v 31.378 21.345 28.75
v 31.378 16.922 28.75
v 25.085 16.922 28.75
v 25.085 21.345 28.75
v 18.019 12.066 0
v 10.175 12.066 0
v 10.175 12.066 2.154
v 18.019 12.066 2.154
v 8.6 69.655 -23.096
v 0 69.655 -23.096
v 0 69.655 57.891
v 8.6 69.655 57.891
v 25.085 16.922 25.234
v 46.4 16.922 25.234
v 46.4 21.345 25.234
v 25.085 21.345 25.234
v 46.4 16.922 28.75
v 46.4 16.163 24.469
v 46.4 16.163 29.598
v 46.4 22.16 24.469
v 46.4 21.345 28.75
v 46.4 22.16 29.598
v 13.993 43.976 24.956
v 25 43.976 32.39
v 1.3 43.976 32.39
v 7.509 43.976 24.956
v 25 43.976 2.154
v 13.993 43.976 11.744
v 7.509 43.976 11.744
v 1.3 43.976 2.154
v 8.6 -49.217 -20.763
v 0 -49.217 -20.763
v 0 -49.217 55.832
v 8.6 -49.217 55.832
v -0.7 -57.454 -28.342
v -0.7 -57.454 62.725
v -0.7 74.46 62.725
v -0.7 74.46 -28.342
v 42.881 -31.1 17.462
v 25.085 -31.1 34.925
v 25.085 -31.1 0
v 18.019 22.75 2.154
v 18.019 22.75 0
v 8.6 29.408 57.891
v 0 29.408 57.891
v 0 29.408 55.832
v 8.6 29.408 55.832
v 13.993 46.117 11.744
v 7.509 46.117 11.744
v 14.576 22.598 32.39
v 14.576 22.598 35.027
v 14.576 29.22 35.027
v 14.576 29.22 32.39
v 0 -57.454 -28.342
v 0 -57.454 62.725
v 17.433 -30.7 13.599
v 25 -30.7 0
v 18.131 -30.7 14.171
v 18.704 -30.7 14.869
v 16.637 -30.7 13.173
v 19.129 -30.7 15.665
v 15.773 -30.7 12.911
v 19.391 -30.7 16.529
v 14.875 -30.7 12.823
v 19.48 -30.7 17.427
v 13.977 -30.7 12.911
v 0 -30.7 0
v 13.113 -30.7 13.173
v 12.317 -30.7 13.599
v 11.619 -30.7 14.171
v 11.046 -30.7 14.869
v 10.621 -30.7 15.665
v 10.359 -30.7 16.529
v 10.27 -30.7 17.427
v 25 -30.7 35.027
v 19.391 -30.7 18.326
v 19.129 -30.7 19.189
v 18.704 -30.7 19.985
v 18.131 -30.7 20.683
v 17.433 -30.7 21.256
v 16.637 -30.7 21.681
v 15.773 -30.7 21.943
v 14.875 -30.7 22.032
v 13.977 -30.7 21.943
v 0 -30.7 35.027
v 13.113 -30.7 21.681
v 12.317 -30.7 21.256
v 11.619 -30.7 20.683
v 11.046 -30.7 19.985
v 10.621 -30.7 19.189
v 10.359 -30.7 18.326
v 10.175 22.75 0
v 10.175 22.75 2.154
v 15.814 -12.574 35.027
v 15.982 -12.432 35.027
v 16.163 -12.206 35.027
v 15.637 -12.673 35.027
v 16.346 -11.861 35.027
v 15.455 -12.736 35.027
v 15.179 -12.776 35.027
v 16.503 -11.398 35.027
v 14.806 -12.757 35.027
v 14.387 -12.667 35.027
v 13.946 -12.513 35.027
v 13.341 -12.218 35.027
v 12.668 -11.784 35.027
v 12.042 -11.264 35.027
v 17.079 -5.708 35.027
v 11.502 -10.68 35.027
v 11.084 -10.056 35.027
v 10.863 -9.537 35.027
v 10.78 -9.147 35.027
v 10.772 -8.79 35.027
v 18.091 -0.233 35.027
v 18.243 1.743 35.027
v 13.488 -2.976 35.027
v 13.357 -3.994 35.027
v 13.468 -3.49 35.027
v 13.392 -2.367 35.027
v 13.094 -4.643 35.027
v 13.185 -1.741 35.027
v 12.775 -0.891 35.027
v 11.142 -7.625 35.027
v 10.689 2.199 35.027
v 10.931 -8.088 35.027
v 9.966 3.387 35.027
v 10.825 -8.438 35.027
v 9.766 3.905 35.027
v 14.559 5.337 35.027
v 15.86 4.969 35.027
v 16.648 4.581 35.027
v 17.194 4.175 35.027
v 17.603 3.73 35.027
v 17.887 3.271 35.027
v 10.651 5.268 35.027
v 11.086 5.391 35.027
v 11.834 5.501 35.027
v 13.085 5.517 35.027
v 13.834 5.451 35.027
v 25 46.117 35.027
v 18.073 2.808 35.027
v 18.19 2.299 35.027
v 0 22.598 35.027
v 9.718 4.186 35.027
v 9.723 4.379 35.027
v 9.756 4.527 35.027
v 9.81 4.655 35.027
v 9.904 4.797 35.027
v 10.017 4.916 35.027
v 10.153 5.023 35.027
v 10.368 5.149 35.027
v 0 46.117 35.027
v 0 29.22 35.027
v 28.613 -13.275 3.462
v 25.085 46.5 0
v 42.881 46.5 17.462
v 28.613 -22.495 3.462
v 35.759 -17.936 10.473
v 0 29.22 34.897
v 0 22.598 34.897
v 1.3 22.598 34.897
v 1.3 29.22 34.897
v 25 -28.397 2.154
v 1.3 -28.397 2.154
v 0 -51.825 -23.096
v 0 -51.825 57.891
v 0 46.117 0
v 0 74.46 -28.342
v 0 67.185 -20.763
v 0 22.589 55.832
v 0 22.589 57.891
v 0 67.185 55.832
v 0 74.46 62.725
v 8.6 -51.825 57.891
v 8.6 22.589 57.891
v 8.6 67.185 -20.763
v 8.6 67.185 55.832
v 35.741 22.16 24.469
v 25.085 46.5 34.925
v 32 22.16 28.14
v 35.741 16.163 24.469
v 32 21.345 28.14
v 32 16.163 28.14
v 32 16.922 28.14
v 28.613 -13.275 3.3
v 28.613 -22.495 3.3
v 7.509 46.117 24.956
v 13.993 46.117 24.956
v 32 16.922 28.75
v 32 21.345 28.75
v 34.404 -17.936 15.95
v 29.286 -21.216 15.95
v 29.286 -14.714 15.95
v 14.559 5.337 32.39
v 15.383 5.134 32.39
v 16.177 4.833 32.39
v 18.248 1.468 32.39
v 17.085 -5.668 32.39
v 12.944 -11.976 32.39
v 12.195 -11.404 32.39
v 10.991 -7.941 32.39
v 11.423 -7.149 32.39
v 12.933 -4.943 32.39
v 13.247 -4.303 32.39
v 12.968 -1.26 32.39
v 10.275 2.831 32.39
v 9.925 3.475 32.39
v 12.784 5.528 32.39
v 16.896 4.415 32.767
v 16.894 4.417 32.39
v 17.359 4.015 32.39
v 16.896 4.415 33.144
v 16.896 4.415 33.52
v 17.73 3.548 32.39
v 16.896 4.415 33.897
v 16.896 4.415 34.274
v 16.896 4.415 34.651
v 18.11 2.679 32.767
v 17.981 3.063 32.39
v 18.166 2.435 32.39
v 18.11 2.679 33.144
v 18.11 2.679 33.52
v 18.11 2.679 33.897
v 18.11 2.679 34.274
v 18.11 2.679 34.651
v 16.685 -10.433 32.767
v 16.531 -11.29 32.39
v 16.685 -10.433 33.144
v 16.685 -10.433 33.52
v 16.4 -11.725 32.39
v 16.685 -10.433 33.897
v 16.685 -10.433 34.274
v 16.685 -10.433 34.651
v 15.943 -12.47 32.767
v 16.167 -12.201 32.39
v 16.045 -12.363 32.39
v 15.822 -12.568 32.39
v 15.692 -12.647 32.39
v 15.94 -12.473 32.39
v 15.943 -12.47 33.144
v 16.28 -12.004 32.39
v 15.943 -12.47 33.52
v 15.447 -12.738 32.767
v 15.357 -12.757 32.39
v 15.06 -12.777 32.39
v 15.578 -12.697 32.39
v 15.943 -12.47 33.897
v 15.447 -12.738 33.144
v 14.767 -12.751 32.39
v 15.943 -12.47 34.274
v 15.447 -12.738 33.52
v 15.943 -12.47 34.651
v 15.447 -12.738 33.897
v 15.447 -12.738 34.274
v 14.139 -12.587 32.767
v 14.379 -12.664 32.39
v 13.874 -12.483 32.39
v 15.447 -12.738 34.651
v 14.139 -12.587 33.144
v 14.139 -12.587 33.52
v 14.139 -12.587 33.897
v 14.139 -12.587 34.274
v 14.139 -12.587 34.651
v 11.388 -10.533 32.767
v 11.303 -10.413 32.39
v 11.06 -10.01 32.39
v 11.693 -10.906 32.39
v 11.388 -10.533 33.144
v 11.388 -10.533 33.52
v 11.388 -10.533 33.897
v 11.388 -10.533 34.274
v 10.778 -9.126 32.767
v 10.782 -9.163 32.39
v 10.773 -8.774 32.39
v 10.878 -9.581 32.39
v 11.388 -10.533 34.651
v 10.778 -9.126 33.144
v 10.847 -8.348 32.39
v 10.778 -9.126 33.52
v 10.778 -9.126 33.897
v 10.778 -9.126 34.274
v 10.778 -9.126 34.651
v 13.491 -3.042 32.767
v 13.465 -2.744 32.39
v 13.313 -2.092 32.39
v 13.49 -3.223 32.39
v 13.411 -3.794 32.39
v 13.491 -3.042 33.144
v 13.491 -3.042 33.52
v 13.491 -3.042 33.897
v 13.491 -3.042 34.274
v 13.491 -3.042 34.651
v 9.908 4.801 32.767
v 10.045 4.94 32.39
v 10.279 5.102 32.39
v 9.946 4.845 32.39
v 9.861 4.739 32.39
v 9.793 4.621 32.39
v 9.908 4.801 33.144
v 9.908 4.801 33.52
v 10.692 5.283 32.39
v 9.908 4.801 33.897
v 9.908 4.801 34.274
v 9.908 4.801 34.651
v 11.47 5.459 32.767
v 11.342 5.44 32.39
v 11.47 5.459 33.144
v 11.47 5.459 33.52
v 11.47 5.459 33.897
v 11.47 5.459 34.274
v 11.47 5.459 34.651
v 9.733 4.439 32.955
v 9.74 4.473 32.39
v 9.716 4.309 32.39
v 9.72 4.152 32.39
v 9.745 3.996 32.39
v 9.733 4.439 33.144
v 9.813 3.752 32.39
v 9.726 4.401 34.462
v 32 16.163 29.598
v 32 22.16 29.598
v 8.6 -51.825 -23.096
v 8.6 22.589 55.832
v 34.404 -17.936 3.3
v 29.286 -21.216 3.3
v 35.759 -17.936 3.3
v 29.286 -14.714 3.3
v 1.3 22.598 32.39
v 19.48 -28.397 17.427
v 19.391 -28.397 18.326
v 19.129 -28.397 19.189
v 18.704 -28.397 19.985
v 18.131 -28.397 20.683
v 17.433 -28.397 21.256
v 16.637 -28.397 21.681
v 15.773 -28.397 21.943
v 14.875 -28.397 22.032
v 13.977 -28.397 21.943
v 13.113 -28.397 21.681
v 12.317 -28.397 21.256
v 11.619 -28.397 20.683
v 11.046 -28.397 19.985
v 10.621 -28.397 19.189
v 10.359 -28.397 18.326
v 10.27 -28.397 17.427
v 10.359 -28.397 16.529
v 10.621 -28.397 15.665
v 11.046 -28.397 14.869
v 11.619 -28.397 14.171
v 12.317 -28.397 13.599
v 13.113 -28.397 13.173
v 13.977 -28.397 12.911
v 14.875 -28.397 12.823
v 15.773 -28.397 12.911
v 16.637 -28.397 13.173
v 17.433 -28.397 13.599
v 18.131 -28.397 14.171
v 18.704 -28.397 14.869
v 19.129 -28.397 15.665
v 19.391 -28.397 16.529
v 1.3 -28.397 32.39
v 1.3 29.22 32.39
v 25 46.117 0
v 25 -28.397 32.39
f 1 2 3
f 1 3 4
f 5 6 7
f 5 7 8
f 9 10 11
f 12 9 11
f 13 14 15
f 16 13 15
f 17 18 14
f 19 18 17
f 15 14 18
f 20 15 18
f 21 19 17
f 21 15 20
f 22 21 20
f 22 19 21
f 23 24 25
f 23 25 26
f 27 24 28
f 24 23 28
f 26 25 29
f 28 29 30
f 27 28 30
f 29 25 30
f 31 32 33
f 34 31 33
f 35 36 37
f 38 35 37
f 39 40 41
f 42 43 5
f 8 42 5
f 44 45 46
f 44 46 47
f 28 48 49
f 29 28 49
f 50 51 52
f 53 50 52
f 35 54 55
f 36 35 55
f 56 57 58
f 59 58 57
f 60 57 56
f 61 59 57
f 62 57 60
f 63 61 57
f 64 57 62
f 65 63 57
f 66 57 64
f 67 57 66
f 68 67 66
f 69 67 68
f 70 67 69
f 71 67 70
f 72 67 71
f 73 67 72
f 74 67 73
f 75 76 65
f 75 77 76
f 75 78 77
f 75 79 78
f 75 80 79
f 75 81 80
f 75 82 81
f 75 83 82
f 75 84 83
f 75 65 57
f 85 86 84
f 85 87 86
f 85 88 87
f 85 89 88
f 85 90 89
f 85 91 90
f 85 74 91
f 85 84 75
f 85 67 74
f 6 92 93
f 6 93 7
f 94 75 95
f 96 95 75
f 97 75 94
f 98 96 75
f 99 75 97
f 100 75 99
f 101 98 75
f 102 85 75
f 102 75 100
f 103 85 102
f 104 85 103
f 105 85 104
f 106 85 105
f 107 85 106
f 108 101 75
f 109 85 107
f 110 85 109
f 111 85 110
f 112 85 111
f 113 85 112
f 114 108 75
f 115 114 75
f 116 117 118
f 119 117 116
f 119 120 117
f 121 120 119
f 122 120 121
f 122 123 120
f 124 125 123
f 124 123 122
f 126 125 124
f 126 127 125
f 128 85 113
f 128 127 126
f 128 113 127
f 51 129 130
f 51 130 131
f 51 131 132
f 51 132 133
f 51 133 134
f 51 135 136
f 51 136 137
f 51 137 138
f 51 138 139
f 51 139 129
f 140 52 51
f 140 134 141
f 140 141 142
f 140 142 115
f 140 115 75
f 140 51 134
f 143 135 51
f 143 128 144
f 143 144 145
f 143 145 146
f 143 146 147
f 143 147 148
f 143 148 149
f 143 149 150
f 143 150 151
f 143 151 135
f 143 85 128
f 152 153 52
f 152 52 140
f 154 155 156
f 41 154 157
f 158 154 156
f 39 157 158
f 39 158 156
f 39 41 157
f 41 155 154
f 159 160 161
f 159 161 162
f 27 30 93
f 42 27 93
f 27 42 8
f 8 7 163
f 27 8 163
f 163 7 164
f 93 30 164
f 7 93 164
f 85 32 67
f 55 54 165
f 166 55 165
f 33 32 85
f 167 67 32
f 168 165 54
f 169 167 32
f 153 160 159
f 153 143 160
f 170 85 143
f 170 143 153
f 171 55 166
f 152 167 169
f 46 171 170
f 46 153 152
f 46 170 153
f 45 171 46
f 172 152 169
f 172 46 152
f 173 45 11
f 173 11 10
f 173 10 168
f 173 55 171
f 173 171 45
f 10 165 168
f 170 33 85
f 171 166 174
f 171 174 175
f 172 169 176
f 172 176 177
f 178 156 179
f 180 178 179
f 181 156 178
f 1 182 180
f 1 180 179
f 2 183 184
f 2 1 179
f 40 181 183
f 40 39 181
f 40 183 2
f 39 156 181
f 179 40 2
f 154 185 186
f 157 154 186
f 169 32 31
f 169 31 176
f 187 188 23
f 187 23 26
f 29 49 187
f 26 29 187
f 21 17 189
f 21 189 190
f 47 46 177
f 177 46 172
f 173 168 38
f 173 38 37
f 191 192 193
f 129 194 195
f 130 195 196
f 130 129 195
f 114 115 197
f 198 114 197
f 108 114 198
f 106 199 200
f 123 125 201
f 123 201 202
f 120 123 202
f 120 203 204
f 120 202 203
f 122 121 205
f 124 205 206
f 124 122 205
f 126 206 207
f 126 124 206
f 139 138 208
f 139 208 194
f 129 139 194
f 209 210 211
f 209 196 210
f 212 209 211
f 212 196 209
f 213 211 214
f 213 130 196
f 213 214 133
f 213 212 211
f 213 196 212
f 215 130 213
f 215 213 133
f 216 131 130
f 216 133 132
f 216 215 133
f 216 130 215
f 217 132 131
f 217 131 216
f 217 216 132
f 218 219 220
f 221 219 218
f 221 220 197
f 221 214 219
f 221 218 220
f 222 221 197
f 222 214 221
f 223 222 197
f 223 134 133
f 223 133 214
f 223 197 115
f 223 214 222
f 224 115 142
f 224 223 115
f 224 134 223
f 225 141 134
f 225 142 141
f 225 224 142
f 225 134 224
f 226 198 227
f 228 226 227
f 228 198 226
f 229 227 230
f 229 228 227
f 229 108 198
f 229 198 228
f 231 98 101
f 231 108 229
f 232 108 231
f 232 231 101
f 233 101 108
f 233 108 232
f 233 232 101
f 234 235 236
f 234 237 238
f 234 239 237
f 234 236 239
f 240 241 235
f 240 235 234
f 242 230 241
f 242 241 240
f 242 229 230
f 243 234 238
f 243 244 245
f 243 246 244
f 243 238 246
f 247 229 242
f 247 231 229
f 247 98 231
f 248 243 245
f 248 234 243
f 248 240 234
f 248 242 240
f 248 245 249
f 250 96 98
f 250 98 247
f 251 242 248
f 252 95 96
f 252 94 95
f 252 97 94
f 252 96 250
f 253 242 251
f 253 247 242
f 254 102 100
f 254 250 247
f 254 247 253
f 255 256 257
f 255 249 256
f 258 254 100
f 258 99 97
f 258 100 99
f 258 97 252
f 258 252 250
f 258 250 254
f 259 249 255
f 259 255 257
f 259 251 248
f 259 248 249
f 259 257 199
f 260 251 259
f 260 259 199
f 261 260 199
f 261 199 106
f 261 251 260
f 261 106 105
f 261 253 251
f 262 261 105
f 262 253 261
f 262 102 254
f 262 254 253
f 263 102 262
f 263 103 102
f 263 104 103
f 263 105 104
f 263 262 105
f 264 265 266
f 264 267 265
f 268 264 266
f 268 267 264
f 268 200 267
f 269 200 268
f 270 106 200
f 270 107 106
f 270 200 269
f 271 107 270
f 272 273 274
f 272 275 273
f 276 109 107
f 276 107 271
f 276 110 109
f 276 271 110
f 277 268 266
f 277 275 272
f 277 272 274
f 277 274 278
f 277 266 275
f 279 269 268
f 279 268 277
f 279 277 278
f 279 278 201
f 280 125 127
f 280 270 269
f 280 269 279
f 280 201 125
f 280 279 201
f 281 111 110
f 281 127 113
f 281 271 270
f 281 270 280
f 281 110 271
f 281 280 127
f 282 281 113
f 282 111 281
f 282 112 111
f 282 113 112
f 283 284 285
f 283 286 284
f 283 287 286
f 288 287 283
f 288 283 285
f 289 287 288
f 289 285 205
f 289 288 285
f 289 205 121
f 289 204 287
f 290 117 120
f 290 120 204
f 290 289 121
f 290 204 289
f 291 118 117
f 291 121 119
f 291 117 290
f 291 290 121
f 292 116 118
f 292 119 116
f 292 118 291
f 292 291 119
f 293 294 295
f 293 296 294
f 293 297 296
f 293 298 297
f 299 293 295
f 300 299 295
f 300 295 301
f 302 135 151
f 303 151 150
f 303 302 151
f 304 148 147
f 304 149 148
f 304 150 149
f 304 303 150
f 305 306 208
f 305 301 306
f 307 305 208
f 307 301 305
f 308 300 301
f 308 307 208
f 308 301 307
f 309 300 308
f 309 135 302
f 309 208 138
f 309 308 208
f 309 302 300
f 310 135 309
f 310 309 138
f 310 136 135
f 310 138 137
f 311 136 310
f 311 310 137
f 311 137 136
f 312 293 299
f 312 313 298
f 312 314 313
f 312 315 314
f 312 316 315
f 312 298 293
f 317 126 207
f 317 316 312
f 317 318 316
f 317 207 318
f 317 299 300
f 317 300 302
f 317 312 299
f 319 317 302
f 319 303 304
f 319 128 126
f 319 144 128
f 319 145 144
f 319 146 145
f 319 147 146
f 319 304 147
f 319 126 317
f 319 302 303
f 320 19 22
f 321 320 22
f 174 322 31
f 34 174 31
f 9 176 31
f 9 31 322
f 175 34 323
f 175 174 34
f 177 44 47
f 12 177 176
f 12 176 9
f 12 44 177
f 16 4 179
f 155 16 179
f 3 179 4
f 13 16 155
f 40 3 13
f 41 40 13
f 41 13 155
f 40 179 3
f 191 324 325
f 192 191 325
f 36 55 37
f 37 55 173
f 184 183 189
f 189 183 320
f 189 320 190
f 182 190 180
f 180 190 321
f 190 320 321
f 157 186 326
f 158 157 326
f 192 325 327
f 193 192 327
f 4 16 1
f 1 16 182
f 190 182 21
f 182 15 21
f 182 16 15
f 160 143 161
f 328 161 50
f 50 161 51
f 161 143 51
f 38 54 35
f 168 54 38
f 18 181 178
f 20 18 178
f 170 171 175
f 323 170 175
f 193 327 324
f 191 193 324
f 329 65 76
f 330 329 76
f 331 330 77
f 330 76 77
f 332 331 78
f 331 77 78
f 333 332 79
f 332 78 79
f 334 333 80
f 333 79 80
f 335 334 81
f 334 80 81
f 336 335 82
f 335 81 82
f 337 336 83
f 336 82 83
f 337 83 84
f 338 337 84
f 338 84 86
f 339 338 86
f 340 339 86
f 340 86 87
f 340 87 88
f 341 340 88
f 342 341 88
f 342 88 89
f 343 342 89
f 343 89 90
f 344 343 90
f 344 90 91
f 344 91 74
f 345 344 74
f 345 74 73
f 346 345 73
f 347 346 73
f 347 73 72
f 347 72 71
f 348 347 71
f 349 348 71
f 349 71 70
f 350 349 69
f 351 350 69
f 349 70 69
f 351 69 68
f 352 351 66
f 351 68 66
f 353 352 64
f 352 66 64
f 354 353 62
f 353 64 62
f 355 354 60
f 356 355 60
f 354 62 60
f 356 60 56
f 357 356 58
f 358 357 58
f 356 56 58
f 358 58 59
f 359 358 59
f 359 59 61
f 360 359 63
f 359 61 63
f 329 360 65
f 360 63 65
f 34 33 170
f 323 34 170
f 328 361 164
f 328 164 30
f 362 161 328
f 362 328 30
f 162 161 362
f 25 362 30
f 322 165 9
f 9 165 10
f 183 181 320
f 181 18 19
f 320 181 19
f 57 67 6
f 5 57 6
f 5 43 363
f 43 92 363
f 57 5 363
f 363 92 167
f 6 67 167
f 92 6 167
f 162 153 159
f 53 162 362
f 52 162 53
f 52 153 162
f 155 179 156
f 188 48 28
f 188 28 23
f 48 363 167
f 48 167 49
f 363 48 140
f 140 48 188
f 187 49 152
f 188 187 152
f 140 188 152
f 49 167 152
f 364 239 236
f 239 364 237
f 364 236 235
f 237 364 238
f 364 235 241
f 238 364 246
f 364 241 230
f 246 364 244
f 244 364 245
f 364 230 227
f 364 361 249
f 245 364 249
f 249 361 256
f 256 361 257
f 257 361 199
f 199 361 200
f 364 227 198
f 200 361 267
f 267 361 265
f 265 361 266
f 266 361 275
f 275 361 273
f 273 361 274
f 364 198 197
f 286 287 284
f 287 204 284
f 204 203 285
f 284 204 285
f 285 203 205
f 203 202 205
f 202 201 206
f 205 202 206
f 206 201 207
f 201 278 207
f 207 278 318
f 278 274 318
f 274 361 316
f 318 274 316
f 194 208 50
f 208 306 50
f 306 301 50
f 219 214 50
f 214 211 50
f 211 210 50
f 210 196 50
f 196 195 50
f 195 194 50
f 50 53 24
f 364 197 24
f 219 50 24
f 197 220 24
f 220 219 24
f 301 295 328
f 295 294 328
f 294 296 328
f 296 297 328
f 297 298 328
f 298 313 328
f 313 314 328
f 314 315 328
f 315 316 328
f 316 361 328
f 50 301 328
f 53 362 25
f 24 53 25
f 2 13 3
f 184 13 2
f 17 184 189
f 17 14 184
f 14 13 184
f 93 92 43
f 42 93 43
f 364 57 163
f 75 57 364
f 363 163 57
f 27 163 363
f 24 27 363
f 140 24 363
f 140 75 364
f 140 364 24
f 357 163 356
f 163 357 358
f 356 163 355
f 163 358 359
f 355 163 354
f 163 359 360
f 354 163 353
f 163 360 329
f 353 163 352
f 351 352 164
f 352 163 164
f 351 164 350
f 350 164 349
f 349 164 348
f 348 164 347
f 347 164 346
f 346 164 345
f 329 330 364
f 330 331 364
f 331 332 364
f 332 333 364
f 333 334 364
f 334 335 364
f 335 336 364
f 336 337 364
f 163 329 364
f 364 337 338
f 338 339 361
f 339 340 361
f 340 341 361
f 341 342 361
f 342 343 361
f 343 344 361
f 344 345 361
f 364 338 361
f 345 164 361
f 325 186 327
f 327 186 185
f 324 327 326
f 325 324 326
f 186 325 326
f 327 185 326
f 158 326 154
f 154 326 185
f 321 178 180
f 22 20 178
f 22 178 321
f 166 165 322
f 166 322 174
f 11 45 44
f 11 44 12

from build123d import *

# Parameters (mm, degrees)
F0_W      = 76.8164917827
F0_H      = 35.0272394717
F1_DEPTH  = 25
F4_DEPTH  = 77.6
F6_DEPTH  = 113
F7_W      = 7.8439377248
F7_H      = 10.683985427
F8_DEPTH  = 25
F9_W      = 14.5757179707
F9_H      = 6.6223032773
F10_DEPTH = 25
F11_R     = 4.6046356053
F12_DEPTH = 25
F14_DEPTH = 25
F16_W     = 5.9973224998
F16_H     = 5.1290784031
F17_DEPTH = 14.4
F18_W     = 4.4231768698
F18_H     = 3.5153124481
F19_DEPTH = 25
F20_W     = 76.7492093146
F20_H     = 34.8965749145
F21_DEPTH = 1.3
F22_W     = 131.9140568376
F22_H     = 91.0675730556
F23_DEPTH = 0.7
F24_W     = 121.4804798365
F24_H     = 80.9869877994
F24_W_2   = 116.401642561
F24_H_2   = 76.5944737941
F25_DEPTH = 8.6
F26_W     = 8.6
F26_H     = 6.8185403943
F27_DEPTH = 9.3
F30_DEPTH = 10.5
F32_DEPTH = 12.65
F33_W     = 6.4838747494
F33_H     = 13.2119907066
F34_DEPTH = 25


with BuildPart() as f1:
    # F0 (on Right) → F1 (new body)
    with BuildSketch(Plane.YZ):
        with Locations((7.7086985111, 17.5136197358)):
            Rectangle(F0_W, F0_H)
    extrude(amount=F1_DEPTH)

    # F5 (on face) → F6 (cut)
    with BuildSketch(Plane(origin=(0, 0, 0), x_dir=(0, -1, 0), z_dir=(-1, 0, 0))):
        Polygon((28.397353366, 2.1544757765), (28.397353366, 32.3902778327), (-43.9755767584, 32.3902778327), (-43.9755767584, 20.4346366227), (-43.9755767584, 12.7295535058), (-43.9755767584, 2.1544757765), align=None)
    extrude(amount=-F6_DEPTH, mode=Mode.SUBTRACT)

    # F7 (on face) → F8 (cut)
    with BuildSketch(Plane(origin=(0, 0, 0), x_dir=(1, 0, 0), z_dir=(0, 0, -1))):
        with Locations((14.097250998, -17.4077088013)):
            Rectangle(F7_W, F7_H)
    extrude(amount=-F8_DEPTH, mode=Mode.SUBTRACT)

    # F9 (on face) → F10 (cut)
    with BuildSketch(Plane.XY.offset(35.0272394717)):
        with Locations((7.2878589854, 25.9091816843)):
            Rectangle(F9_W, F9_H)
    extrude(amount=-F10_DEPTH, mode=Mode.SUBTRACT)

    # F11 (on face) → F12 (cut)
    with BuildSketch(Plane.XZ.offset(30.6995473802)):
        with Locations((14.8750739172, 17.4272339791)):
            Circle(F11_R)
    extrude(amount=-F12_DEPTH, mode=Mode.SUBTRACT)

    # F13 (on face) → F14 (cut)
    with BuildSketch(Plane.XY.offset(35.0272394717)):
        with BuildLine():
            add(Edge.make_bspline(
                [(14.5585378632, 5.3374832496), (16.4432223112, 4.970494678), (19.5335391994, 2.9443472499), (16.3368578812, -5.5292212959), (17.2689532903, -15.3294419765), (7.7478224776, -8.7886932475), (16.9188142819, -3.3946672349), (6.4593634536, 5.4082025498), (12.5736357041, 5.7239863636), (14.5585378632, 5.3374832496)],
                knots=[0, 0, 0, 0, 0.1182682615, 0.2855748906, 0.4318963462, 0.5683208229, 0.7132399397, 0.8754428478, 1, 1, 1, 1], degree=3))
        make_face()
    extrude(amount=-F14_DEPTH, mode=Mode.SUBTRACT)

    # F20 (on Right) → F21 (join)
    with BuildSketch(Plane.YZ):
        with Locations((7.7353324741, 17.4482874572)):
            Rectangle(F20_W, F20_H)
    extrude(amount=F21_DEPTH)

    # F22 (on Right) → F23 (join)
    with BuildSketch(Plane.YZ):
        with Locations((8.50334391, 17.1913476661)):
            Rectangle(F22_W, F22_H)
    extrude(amount=-F23_DEPTH)

    # F24 (on face) → F25 (join)
    with BuildSketch(Plane.YZ):
        with Locations((8.9151412249, 17.3972453922)):
            Rectangle(F24_W, F24_H)
        with Locations((8.9837759733, 17.5345083699)):
            Rectangle(F24_W_2, F24_H_2, mode=Mode.SUBTRACT)
    extrude(amount=F25_DEPTH)

    # F26 (on face) → F27 (cut)
    with BuildSketch(Plane.XY.offset(57.8907392919)):
        with Locations((4.3, 25.9987283498)):
            Rectangle(F26_W, F26_H)
    extrude(amount=-F27_DEPTH, mode=Mode.SUBTRACT)

    # F33 (on face) → F34 (cut)
    with BuildSketch(Plane(origin=(0, 46.1169444025, 0), x_dir=(-1, 0, 0), z_dir=(0, 1, 0))):
        with Locations((-10.7512504328, 18.3495716192)):
            Rectangle(F33_W, F33_H)
    extrude(amount=-F34_DEPTH, mode=Mode.SUBTRACT)


with BuildPart() as f4:
    # F3 (on offset) → F4 (new body)
    with BuildSketch(Plane.XZ.offset(31.0995473802)):
        Polygon((25.0851362944, 34.9248088896), (25.0851362944, 0), (42.8811361204, 17.4624044448), align=None)
    extrude(amount=-F4_DEPTH)

    # F16 (on offset) → F17 (join)
    with BuildSketch(Plane.YZ.offset(46.4)):
        with Locations((19.1611722112, 27.0335683599)):
            Rectangle(F16_W, F16_H)
    extrude(amount=-F17_DEPTH)

    # F18 (on face) → F19 (cut)
    with BuildSketch(Plane.YZ.offset(46.4)):
        with Locations((19.133512862, 26.9918525591)):
            Rectangle(F18_W, F18_H)
    extrude(amount=-F19_DEPTH, mode=Mode.SUBTRACT)

    # F29 (on offset) → F30 (join)
    with BuildSketch(Plane.XY.offset(3.3)):
        Polygon((28.6128576845, -22.4952923471), (35.7585884631, -17.9356448352), (28.6128576845, -13.2752452046), align=None)
    extrude(amount=F30_DEPTH)

    # F31 (on face) → F32 (cut)
    with BuildSketch(Plane(origin=(0, 0, 3.3), x_dir=(1, 0, 0), z_dir=(0, 0, -1))):
        Polygon((34.4042517245, 17.9356448352), (29.2856078595, 21.2162099779), (29.2856078595, 14.7136887535), align=None)
    extrude(amount=-F32_DEPTH, mode=Mode.SUBTRACT)


solid = Compound([f1.part, f4.part])
